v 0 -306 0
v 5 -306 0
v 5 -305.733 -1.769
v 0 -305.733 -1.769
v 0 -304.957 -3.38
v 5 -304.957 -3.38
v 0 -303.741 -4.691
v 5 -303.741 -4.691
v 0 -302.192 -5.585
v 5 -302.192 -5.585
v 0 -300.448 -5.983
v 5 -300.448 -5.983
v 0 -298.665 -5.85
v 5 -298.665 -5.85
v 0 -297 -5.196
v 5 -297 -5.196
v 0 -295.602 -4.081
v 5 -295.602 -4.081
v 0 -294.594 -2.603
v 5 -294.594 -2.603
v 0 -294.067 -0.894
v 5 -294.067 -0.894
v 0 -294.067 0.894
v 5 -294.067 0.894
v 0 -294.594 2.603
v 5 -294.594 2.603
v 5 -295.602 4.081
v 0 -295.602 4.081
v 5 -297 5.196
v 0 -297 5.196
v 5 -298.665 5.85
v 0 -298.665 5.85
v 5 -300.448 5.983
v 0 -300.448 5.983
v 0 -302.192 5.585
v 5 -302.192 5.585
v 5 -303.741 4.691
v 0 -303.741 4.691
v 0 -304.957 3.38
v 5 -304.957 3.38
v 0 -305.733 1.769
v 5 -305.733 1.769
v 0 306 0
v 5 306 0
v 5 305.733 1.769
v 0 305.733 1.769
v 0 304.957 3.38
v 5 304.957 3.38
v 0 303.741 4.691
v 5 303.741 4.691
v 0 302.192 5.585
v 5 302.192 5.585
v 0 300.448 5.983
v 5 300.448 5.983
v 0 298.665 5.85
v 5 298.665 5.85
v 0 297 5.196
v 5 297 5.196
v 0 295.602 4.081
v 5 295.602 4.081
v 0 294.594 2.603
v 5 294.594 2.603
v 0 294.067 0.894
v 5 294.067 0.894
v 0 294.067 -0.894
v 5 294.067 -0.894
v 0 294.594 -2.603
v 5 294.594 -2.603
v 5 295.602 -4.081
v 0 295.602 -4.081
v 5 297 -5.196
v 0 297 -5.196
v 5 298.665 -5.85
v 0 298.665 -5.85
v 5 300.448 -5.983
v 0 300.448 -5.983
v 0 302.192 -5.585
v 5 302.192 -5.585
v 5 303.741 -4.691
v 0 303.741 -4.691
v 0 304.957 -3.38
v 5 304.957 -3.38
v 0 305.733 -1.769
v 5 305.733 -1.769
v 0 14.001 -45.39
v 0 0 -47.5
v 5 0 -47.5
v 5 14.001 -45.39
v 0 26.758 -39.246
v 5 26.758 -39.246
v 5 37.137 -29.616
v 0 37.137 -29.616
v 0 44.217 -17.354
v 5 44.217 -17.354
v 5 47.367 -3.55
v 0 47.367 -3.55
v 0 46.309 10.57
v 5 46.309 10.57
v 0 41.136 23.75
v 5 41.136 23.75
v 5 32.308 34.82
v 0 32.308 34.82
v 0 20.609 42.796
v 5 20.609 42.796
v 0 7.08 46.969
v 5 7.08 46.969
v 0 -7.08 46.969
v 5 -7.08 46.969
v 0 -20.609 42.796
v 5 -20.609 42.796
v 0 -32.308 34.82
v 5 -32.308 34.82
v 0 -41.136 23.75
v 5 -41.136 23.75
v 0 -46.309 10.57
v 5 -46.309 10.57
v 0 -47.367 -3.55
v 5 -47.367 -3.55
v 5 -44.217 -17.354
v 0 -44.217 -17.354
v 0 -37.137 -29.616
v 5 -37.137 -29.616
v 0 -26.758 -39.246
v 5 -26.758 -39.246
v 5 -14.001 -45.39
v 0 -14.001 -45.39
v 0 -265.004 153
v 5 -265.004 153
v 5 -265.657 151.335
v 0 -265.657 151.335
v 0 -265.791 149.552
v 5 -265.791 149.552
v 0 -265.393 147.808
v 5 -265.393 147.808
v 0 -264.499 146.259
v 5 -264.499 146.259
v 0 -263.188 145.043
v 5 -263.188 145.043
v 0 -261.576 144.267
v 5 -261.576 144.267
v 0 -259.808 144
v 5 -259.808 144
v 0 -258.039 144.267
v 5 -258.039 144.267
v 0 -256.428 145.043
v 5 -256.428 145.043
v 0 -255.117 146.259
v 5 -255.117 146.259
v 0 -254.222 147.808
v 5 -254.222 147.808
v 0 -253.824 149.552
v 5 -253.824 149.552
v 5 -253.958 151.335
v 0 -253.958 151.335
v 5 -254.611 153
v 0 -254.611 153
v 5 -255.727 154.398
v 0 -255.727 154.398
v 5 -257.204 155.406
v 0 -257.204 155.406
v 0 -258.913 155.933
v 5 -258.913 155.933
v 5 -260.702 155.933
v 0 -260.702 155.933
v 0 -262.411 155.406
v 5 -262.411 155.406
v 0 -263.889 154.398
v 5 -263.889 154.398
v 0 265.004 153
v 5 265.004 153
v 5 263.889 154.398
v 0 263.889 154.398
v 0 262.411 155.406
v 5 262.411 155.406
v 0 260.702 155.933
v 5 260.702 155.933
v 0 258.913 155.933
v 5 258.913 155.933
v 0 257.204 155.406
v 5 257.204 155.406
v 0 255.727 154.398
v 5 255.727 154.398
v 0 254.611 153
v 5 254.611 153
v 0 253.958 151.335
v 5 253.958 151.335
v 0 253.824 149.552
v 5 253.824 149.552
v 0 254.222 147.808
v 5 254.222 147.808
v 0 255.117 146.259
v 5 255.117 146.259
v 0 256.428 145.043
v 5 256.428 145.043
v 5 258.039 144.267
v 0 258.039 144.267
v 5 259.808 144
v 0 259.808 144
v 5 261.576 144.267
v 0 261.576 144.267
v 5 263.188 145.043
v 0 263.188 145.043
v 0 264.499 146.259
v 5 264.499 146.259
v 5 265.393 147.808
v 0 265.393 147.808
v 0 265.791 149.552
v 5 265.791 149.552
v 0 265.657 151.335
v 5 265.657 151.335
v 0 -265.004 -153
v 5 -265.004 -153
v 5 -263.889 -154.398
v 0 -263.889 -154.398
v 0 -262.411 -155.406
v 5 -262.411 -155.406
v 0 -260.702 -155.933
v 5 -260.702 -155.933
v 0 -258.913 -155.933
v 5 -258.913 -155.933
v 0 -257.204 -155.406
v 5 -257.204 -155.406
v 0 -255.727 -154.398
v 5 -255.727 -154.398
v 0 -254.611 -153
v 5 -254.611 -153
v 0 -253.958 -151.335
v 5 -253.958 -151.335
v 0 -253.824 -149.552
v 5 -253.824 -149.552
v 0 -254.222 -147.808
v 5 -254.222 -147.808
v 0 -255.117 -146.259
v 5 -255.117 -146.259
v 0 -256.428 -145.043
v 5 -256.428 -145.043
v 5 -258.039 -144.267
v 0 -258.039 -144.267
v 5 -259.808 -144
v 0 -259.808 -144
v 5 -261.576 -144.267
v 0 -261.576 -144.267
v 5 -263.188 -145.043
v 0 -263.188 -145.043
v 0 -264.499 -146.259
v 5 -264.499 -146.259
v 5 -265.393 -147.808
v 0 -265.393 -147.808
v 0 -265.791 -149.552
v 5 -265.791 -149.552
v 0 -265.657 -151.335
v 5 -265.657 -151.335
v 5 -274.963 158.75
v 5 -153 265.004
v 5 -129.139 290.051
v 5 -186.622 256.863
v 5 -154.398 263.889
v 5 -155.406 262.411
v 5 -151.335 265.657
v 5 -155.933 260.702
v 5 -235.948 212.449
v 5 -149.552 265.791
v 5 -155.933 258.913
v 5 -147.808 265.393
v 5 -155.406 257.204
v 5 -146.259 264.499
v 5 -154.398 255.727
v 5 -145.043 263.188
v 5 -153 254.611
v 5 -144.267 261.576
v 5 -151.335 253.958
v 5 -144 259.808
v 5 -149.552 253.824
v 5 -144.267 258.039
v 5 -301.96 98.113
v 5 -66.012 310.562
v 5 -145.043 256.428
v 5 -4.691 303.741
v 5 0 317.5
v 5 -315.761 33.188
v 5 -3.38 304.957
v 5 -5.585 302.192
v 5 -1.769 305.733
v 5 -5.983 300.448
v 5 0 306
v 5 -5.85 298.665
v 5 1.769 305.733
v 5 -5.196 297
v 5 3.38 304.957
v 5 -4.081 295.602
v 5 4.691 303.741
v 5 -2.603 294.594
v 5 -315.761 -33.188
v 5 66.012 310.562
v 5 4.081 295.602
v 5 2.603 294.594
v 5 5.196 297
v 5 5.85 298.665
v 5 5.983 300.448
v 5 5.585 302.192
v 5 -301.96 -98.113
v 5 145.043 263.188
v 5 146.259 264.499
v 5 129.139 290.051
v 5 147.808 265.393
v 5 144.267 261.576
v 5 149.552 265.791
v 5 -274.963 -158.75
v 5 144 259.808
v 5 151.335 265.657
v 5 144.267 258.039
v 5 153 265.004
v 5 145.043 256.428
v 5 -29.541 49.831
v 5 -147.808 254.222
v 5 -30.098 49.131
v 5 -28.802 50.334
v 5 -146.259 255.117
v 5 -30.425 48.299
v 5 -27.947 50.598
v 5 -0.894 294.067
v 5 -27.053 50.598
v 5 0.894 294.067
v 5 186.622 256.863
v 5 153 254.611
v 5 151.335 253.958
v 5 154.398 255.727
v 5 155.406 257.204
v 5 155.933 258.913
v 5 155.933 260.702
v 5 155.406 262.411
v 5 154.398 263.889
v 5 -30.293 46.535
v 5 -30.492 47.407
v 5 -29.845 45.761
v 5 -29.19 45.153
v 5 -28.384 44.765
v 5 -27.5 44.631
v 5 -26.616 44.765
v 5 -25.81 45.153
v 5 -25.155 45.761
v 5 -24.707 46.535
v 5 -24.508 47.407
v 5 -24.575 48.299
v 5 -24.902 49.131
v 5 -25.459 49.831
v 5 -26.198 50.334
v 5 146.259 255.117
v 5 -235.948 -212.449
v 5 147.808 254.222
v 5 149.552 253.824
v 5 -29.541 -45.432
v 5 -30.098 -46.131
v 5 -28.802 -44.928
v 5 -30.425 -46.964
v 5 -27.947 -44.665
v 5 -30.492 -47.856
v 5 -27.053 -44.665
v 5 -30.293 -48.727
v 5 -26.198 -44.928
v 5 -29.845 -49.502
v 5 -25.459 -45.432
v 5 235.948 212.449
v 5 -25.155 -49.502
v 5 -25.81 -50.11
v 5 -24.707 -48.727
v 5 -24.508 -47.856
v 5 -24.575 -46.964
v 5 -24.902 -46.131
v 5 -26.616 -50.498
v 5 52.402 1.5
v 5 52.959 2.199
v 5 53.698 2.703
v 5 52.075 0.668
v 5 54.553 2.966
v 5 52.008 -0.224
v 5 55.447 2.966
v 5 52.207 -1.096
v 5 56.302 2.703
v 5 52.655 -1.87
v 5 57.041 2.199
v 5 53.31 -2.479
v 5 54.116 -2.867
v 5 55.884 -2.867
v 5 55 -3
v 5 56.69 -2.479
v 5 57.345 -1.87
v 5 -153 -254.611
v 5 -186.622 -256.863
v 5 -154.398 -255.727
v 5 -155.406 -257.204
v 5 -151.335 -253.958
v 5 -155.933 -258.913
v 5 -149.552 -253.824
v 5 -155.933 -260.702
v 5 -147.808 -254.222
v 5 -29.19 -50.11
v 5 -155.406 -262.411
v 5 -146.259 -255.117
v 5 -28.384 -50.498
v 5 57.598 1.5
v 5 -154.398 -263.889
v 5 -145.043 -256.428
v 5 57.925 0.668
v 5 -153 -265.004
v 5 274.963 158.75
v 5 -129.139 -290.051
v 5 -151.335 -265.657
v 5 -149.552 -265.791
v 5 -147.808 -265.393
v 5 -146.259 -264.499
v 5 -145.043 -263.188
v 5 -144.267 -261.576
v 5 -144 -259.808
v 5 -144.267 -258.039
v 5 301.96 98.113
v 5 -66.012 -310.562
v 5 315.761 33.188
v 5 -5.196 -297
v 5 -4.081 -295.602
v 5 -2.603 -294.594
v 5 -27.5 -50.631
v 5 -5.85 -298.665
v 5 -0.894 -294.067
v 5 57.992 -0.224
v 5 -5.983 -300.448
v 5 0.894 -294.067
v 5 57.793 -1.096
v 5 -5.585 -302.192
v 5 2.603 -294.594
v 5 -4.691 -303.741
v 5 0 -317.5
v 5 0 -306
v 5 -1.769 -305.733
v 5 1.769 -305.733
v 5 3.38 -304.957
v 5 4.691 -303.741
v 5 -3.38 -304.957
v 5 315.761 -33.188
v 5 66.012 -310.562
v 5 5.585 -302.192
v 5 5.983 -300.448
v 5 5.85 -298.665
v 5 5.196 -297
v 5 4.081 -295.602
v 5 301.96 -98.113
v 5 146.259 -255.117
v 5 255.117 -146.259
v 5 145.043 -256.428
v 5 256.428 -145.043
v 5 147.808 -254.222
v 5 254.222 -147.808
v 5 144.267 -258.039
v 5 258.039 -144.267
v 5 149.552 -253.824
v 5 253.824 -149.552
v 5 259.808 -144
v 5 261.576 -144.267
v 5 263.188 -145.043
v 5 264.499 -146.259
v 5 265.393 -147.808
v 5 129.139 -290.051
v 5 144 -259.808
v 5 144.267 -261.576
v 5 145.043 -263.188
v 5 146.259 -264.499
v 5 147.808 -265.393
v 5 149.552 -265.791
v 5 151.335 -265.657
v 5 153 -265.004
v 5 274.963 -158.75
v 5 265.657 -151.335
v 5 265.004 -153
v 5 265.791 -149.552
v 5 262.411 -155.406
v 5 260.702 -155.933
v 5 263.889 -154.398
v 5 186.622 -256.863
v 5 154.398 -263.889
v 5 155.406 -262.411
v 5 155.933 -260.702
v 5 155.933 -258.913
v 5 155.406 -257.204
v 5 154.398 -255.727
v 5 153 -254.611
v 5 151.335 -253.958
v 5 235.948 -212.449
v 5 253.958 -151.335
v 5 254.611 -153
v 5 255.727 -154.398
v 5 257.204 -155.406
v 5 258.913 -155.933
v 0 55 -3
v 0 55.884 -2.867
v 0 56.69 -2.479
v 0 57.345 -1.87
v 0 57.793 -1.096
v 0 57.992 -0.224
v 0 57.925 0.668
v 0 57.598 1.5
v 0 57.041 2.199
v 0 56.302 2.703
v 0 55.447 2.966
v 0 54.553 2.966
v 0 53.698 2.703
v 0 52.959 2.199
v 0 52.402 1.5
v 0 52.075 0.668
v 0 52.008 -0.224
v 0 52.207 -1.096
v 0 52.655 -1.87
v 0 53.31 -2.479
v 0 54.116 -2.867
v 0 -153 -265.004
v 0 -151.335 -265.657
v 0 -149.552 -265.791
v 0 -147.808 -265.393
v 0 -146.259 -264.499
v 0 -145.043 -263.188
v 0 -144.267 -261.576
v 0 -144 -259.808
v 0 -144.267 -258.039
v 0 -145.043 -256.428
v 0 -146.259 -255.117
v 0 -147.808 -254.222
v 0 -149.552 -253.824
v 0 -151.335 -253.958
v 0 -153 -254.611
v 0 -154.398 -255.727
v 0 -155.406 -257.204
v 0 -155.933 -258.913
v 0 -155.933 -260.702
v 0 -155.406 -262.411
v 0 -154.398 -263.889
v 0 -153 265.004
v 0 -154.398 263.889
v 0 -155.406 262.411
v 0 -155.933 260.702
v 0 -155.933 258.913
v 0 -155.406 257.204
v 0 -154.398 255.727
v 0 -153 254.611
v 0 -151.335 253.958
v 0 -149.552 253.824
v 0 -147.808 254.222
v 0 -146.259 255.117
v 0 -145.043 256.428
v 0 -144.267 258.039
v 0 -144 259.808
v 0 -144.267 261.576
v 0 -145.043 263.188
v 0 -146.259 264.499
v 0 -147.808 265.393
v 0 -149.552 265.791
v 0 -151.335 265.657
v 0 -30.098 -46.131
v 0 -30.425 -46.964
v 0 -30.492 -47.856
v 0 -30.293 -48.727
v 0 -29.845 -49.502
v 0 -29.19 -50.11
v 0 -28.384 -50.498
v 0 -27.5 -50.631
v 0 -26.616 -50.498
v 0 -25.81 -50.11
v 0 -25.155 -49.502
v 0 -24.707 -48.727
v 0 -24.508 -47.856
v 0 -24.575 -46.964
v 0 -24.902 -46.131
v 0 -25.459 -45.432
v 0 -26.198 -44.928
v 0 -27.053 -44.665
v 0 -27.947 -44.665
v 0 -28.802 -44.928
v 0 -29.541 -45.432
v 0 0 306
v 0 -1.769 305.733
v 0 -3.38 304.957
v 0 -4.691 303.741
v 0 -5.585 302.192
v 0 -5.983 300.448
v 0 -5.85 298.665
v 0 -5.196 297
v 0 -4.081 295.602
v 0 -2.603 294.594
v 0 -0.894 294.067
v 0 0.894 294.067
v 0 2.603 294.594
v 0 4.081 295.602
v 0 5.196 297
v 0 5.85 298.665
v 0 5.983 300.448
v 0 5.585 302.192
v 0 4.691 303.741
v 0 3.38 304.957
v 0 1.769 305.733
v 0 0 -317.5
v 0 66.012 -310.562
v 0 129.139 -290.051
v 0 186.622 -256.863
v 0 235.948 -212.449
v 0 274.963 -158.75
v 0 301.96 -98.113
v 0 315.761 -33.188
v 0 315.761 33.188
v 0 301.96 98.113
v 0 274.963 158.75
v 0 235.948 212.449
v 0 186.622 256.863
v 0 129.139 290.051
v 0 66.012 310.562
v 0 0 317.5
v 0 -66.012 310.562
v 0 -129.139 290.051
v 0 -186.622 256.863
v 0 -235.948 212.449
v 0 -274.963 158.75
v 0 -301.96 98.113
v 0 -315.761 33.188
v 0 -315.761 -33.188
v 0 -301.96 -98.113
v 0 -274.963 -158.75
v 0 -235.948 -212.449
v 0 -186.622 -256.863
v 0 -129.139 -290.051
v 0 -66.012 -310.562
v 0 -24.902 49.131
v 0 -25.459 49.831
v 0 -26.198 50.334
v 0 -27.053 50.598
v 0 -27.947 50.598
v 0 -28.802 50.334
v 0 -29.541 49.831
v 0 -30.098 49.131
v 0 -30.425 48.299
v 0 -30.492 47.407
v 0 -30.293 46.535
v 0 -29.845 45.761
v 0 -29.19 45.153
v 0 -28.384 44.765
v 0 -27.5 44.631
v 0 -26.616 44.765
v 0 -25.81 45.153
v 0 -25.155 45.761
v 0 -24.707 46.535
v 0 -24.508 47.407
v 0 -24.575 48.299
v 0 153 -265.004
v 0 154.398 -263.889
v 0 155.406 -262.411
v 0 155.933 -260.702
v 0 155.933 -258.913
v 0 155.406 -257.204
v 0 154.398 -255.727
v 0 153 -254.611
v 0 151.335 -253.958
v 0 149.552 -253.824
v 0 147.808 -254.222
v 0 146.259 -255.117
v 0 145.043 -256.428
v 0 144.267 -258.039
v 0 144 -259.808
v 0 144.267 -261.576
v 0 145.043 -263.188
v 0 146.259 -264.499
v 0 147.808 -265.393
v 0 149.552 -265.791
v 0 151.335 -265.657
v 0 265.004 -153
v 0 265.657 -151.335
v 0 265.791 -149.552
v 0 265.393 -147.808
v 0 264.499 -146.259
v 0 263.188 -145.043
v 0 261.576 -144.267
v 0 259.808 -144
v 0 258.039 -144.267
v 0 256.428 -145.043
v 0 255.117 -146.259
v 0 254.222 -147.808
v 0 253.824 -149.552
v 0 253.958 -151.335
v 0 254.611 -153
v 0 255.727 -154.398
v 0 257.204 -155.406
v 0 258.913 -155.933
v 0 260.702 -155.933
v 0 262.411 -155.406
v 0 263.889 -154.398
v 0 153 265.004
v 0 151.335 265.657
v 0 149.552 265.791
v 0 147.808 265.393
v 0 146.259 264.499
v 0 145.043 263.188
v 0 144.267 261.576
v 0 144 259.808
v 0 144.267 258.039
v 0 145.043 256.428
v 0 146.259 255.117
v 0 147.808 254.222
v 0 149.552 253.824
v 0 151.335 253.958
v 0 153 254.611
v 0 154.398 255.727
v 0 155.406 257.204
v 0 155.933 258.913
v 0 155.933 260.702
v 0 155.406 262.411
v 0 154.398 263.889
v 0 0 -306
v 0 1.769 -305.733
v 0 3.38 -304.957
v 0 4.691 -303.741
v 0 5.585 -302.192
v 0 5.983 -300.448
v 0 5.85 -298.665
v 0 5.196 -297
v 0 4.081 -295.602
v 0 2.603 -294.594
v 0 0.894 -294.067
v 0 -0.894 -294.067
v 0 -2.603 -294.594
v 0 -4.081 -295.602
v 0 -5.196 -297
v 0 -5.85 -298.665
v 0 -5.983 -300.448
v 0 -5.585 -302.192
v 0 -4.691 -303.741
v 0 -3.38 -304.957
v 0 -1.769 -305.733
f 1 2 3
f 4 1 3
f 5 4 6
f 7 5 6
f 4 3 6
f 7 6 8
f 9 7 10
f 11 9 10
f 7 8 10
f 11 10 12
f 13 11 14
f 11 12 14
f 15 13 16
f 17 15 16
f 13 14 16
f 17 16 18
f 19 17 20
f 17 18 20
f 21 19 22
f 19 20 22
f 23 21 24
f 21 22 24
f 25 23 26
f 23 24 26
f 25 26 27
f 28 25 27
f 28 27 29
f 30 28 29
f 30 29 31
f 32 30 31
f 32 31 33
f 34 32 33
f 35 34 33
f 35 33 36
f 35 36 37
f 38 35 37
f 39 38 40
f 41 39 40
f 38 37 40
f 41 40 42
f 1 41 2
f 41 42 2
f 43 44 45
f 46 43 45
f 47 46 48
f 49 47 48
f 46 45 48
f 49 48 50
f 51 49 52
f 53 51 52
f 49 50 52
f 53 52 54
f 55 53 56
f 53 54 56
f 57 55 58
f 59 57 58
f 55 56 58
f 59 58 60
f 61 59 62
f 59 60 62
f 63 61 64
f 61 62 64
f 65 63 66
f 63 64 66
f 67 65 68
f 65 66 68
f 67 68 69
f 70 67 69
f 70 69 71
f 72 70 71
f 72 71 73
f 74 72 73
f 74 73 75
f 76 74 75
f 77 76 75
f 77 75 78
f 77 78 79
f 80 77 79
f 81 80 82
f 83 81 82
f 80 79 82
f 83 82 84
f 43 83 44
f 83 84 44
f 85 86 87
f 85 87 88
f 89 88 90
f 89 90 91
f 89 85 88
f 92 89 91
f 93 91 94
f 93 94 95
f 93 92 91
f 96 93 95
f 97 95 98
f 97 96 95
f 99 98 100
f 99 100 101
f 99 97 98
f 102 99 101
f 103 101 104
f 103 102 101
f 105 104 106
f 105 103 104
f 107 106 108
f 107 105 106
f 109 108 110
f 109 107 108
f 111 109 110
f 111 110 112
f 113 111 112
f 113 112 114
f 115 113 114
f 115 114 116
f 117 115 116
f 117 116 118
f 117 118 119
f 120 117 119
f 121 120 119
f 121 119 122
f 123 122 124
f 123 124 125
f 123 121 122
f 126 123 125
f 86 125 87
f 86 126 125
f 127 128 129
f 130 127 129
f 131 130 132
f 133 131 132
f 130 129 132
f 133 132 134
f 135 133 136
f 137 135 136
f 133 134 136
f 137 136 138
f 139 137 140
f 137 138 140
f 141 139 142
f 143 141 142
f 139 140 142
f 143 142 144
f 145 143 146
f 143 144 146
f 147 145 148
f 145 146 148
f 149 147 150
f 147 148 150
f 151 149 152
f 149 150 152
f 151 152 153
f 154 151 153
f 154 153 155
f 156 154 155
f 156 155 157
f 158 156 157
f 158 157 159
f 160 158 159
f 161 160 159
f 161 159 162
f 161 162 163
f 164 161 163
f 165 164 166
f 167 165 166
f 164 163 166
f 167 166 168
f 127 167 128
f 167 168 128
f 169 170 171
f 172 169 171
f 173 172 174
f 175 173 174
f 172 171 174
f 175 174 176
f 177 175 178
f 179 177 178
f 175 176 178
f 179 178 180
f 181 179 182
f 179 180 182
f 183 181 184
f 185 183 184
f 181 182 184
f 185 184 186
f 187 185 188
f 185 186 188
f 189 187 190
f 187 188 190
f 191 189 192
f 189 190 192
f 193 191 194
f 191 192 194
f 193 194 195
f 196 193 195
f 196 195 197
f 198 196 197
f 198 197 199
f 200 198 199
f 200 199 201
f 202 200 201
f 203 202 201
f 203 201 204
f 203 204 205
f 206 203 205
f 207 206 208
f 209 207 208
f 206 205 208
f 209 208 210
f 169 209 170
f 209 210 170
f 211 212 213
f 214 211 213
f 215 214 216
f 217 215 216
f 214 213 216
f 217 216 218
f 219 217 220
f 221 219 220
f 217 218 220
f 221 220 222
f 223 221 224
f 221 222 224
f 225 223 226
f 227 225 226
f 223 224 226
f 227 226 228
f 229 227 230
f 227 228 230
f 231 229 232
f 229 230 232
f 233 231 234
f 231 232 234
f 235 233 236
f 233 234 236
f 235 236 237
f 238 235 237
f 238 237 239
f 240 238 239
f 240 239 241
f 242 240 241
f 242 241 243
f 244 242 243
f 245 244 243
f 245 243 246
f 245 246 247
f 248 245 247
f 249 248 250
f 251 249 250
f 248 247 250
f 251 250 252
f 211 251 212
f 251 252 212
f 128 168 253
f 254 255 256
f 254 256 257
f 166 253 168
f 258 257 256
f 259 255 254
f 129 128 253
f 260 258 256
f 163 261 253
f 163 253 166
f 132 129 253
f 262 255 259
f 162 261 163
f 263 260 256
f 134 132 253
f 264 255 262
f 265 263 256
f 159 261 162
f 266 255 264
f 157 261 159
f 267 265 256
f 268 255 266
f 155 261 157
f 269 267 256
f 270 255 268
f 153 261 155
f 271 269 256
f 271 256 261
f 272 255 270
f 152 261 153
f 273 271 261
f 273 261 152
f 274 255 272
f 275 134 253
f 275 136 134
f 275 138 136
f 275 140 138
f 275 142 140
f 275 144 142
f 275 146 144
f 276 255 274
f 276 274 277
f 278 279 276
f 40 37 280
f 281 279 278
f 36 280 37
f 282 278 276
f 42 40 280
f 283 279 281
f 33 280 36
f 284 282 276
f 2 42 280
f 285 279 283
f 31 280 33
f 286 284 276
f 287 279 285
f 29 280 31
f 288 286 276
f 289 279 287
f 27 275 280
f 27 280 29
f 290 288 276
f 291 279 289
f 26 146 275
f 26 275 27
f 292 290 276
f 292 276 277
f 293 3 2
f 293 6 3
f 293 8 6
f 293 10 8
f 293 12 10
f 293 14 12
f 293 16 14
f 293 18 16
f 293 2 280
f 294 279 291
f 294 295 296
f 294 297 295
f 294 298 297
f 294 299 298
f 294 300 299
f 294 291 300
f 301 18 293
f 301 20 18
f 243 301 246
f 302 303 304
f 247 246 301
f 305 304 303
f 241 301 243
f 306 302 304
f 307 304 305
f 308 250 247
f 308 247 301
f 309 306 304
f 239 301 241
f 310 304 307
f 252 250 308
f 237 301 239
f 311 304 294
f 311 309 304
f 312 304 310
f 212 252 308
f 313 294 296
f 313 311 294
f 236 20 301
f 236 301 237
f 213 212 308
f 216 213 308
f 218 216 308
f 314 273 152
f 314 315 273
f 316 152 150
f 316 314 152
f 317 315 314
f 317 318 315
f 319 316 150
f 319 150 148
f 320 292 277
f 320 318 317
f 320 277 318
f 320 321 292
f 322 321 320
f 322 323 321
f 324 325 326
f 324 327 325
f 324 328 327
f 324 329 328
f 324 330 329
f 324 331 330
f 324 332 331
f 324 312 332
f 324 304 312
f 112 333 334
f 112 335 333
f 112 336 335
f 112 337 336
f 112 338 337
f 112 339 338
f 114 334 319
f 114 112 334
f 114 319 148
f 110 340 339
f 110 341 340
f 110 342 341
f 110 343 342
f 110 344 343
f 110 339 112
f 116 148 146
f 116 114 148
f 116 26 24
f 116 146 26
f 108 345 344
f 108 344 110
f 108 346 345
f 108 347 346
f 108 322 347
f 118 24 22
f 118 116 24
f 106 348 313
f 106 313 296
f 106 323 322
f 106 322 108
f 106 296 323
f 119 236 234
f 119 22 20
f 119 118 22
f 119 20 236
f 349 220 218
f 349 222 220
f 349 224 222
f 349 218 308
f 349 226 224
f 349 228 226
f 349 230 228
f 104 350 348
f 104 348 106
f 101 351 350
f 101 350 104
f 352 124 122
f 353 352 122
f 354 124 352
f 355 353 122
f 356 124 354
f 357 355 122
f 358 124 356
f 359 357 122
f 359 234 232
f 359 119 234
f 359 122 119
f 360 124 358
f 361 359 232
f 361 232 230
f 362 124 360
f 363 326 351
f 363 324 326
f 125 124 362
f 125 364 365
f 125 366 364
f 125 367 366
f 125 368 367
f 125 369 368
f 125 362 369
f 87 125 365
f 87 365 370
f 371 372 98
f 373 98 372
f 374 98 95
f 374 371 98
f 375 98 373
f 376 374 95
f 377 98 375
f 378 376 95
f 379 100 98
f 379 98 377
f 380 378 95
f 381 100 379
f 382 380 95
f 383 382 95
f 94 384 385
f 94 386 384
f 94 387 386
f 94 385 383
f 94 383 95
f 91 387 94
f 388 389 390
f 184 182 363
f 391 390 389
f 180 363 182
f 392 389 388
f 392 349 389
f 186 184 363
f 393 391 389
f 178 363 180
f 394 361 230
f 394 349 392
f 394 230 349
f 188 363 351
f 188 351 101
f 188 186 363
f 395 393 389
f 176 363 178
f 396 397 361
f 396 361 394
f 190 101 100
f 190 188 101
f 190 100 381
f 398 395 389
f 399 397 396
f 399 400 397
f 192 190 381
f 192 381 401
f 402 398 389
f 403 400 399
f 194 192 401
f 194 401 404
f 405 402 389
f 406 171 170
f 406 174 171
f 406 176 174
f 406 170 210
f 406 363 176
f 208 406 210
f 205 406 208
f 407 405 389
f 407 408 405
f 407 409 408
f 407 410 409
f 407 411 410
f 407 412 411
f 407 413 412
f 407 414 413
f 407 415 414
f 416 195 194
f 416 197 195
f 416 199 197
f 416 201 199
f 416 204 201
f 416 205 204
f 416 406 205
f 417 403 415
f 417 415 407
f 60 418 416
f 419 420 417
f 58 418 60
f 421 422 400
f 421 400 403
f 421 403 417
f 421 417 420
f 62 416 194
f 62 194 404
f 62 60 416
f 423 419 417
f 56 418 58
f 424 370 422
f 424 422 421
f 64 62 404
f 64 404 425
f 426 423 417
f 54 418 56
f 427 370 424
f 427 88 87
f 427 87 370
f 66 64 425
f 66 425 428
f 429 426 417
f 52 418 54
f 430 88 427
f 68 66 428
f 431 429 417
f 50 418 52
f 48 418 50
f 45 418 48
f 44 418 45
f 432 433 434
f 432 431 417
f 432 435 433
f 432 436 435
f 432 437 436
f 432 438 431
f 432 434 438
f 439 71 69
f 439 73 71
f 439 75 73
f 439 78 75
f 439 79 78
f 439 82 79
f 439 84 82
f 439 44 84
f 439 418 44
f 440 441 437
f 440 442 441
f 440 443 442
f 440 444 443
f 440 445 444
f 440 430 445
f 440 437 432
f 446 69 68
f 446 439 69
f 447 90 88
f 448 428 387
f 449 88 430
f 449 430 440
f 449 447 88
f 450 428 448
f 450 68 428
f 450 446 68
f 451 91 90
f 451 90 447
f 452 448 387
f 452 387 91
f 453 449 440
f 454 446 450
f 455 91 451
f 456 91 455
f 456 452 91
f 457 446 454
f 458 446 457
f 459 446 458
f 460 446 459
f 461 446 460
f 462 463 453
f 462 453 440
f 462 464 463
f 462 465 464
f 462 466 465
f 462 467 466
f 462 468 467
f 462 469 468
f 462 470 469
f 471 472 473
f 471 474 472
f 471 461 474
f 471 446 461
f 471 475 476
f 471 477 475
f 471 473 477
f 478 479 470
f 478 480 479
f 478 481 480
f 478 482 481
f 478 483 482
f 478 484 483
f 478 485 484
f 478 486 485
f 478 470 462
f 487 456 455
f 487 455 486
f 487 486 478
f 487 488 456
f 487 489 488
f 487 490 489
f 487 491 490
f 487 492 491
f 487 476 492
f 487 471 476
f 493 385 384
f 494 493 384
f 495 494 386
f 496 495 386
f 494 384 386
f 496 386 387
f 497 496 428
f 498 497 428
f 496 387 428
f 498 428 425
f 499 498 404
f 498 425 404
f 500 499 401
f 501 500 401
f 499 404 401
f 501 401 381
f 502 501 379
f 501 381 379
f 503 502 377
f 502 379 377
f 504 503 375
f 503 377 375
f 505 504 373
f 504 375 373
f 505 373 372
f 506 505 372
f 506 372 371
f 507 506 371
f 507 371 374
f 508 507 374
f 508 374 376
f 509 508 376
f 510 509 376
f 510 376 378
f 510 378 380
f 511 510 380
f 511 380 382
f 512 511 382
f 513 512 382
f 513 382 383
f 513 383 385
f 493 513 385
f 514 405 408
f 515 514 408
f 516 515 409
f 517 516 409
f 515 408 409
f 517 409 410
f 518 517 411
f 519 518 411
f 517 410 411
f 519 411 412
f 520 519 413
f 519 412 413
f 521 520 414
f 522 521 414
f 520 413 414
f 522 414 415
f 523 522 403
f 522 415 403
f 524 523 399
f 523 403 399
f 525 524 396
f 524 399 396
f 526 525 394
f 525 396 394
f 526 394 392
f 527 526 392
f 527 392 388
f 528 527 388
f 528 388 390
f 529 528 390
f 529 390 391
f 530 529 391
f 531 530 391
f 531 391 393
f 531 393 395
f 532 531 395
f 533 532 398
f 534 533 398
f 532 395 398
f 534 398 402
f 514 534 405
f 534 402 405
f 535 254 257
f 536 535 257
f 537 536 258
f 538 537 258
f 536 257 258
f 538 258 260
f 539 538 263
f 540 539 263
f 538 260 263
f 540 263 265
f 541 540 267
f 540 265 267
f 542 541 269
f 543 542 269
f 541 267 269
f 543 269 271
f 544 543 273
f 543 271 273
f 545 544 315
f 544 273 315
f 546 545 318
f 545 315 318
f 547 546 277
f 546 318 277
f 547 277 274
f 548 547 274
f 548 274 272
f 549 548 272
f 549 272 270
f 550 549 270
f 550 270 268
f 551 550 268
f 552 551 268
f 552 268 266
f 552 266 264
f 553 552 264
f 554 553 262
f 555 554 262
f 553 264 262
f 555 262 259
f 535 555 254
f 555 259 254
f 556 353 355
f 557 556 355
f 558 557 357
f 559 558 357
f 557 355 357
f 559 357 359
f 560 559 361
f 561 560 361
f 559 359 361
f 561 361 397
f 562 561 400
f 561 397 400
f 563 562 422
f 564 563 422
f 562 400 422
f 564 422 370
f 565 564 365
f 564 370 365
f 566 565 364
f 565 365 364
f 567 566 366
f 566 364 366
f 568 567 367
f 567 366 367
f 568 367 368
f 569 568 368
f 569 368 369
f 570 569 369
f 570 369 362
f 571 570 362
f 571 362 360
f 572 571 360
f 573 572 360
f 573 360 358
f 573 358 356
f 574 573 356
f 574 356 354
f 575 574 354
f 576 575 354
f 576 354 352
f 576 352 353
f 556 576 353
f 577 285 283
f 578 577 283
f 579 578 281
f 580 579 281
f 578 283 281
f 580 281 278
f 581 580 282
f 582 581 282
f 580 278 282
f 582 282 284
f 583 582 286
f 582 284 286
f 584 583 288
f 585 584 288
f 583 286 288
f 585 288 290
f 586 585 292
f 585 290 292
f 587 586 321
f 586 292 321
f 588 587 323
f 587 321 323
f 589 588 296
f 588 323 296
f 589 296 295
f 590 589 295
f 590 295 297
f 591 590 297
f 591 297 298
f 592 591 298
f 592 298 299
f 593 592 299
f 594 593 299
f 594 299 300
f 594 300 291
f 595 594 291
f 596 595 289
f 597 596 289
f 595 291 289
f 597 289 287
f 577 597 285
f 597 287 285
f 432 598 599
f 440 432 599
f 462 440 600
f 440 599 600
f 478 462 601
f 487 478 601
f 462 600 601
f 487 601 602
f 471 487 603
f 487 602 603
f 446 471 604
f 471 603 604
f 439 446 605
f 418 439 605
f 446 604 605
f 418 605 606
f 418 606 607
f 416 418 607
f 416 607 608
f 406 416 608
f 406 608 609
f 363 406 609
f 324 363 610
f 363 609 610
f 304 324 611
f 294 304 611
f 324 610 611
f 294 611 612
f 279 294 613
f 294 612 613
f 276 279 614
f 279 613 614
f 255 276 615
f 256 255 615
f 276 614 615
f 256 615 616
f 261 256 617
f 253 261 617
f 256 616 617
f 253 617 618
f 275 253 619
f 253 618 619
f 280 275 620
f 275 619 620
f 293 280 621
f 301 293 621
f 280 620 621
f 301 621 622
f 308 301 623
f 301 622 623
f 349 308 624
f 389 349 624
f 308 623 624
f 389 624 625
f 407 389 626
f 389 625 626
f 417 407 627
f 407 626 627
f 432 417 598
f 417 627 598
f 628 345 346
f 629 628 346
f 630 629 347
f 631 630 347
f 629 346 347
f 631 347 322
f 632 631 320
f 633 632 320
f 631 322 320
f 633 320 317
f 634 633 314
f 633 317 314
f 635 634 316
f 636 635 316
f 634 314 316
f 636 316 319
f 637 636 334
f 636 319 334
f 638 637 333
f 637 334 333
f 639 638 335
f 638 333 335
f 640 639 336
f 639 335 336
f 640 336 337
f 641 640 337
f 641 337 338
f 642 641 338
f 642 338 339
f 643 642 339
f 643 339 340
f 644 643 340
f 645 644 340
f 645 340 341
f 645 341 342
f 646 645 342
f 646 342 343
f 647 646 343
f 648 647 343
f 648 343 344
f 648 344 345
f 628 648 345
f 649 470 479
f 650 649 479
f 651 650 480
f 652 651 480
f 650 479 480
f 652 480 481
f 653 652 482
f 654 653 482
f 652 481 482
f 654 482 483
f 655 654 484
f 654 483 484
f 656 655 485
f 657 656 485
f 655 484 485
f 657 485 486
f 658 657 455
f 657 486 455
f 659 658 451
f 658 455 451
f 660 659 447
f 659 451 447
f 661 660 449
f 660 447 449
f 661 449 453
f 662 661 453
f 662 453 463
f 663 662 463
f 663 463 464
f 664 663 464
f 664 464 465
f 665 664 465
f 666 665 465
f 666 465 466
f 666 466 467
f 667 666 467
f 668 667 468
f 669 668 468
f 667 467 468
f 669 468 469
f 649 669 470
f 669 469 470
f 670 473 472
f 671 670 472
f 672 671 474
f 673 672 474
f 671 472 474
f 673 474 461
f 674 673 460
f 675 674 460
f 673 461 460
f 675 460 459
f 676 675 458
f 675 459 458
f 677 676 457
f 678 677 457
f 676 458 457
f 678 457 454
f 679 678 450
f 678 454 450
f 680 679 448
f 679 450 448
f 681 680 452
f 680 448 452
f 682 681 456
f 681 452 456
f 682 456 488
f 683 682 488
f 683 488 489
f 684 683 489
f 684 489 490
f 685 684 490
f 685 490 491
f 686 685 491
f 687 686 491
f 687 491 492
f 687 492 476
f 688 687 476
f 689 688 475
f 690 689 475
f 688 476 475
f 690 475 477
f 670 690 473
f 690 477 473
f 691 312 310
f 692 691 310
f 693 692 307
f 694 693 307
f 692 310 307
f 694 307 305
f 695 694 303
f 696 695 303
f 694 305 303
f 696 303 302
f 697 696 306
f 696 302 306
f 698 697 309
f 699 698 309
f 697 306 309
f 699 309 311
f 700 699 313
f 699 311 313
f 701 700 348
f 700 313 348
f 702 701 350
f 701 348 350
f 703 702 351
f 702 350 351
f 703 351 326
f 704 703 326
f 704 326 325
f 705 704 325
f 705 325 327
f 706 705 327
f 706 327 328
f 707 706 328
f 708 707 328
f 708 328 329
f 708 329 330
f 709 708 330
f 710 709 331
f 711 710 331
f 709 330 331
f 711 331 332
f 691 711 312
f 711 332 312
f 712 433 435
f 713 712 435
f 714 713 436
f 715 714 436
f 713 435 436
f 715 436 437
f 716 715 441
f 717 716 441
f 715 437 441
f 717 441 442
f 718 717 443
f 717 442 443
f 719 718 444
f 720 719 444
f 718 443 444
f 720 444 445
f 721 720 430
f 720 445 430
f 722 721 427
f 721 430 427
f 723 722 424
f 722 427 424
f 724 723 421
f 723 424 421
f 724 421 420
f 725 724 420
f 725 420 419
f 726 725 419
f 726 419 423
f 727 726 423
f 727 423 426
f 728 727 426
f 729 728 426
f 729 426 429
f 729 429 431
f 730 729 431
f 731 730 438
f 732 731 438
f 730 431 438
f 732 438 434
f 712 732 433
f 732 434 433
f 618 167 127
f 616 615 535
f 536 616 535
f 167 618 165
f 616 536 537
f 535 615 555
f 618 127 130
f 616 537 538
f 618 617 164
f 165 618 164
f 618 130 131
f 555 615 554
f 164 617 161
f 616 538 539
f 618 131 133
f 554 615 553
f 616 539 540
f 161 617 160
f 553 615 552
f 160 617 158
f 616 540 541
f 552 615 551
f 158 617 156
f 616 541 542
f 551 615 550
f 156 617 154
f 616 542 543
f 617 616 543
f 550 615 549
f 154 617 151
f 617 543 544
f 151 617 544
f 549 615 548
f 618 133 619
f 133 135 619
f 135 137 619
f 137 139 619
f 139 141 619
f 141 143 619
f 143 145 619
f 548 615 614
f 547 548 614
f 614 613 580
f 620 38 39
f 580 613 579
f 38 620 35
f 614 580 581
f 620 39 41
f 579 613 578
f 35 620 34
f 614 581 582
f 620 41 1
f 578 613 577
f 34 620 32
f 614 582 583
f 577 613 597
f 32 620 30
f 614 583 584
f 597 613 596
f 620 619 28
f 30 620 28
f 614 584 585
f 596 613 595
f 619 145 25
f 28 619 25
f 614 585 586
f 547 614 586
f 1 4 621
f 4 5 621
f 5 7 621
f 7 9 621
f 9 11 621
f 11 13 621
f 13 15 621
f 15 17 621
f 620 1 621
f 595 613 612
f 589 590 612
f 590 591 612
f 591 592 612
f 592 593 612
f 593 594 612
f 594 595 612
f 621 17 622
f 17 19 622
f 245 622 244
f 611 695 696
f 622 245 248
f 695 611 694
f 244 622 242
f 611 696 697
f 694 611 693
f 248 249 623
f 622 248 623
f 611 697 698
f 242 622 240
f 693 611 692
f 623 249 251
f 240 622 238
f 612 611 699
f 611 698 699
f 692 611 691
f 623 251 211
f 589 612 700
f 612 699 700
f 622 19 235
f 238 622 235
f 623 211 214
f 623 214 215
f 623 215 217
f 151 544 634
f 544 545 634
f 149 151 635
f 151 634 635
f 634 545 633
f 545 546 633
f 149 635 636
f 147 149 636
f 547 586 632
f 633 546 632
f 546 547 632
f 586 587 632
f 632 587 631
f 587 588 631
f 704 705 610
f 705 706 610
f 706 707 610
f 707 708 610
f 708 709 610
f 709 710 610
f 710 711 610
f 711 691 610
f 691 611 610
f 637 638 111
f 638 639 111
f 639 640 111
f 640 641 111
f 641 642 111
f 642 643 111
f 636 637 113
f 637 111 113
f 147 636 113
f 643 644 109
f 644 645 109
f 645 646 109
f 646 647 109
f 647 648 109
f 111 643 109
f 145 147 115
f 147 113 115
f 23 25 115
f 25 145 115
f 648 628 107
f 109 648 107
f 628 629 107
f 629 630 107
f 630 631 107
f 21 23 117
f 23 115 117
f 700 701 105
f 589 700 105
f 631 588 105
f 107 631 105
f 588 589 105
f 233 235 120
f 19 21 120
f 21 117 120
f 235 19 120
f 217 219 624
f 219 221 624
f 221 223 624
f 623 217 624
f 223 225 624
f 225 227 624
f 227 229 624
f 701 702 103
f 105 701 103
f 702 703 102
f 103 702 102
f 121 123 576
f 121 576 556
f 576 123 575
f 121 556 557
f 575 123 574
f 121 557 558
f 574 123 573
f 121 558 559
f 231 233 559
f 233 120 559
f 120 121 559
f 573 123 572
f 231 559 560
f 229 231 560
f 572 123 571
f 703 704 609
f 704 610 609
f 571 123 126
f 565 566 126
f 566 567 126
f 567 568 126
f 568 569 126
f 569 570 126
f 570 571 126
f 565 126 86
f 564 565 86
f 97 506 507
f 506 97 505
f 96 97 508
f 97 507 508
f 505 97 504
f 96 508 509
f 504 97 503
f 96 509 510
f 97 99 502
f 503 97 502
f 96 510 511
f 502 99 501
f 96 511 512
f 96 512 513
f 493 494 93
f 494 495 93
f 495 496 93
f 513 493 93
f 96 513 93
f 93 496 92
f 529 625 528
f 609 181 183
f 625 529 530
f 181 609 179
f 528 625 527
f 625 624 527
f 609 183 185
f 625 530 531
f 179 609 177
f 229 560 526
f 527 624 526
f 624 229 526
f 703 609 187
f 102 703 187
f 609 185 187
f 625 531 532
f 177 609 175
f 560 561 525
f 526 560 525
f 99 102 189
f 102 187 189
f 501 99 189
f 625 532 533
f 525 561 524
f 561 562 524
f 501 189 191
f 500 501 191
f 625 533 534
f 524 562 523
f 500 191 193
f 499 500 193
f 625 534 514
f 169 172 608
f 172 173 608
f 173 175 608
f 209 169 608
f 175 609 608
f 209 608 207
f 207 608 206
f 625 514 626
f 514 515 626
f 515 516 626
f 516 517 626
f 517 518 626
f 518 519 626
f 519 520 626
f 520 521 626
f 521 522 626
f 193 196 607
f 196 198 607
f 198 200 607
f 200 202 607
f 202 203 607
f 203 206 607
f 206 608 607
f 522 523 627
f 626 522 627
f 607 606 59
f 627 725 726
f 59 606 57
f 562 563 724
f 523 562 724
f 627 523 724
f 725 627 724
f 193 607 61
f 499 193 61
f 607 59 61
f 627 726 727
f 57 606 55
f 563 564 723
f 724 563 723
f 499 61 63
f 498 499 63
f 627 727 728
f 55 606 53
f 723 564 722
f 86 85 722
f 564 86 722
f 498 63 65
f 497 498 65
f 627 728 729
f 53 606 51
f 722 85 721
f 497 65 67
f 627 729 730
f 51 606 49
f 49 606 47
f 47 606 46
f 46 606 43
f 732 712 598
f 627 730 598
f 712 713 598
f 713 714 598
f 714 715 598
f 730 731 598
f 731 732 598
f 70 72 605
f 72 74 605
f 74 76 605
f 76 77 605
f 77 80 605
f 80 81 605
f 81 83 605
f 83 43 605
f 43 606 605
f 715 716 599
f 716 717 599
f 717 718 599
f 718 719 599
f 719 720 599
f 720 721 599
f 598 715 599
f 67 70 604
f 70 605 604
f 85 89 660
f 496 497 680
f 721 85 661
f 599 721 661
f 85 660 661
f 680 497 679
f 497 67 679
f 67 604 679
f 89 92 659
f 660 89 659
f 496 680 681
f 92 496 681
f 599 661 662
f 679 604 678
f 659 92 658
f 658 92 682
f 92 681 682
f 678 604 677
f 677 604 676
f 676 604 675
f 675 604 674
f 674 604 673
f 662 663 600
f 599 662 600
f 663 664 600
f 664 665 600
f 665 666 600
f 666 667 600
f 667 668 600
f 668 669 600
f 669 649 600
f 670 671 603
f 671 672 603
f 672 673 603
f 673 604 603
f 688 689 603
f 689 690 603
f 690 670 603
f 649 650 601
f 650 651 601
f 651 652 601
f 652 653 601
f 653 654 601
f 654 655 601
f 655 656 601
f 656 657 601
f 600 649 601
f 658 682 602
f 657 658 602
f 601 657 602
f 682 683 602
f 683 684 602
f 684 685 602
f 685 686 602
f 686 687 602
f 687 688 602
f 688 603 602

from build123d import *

# Parameters (mm, degrees)
SKETCH1_R           = 317.5
SKETCH1_R_2         = 47.5
BOSS_EXTRUDE1_DEPTH = 5
SKETCH2_R           = 6
CUT_EXTRUDE1_DEPTH  = 5
CIRPATTERN1_COUNT   = 12
SKETCH6_R           = 3
CUT_EXTRUDE2_DEPTH  = 10
CIRPATTERN2_COUNT   = 3


with BuildPart() as part:
    # Sketch1 → Boss-Extrude1 (new body)
    with BuildSketch(Plane(origin=(0, 0, 0), x_dir=(0, 0, -1), z_dir=(1, 0, 0))):
        Circle(SKETCH1_R)
        Circle(SKETCH1_R_2, mode=Mode.SUBTRACT)
    extrude(amount=BOSS_EXTRUDE1_DEPTH)

    # Sketch2 → Cut-Extrude1 (cut)
    with BuildSketch(Plane(origin=(5, 0, 0), x_dir=(0, 0, -1), z_dir=(1, 0, 0))):
        with Locations((300, 0)):
            Circle(SKETCH2_R)
    cut_extrude1 = extrude(amount=-CUT_EXTRUDE1_DEPTH, mode=Mode.SUBTRACT)

    # CirPattern1: Cut-Extrude1 ×12 about axis
    cirpattern1_axis = Axis((0, 0, 0), (1, 0, 0))
    for i in range(1, CIRPATTERN1_COUNT):
        add(cut_extrude1.rotate(cirpattern1_axis, i * 360 / CIRPATTERN1_COUNT), mode=Mode.SUBTRACT)

    # Sketch6 → Cut-Extrude2 (cut)
    with BuildSketch(Plane(origin=(5, 0, 0), x_dir=(0, 0, -1), z_dir=(1, 0, 0))):
        with Locations((0, 55)):
            Circle(SKETCH6_R)
    cut_extrude2 = extrude(amount=-CUT_EXTRUDE2_DEPTH, mode=Mode.SUBTRACT)

    # CirPattern2: Cut-Extrude2 ×3 about axis
    cirpattern2_axis = Axis((0, 0, 0), (1, 0, 0))
    for i in range(1, CIRPATTERN2_COUNT):
        add(cut_extrude2.rotate(cirpattern2_axis, i * 360 / CIRPATTERN2_COUNT), mode=Mode.SUBTRACT)


solid = part.part
